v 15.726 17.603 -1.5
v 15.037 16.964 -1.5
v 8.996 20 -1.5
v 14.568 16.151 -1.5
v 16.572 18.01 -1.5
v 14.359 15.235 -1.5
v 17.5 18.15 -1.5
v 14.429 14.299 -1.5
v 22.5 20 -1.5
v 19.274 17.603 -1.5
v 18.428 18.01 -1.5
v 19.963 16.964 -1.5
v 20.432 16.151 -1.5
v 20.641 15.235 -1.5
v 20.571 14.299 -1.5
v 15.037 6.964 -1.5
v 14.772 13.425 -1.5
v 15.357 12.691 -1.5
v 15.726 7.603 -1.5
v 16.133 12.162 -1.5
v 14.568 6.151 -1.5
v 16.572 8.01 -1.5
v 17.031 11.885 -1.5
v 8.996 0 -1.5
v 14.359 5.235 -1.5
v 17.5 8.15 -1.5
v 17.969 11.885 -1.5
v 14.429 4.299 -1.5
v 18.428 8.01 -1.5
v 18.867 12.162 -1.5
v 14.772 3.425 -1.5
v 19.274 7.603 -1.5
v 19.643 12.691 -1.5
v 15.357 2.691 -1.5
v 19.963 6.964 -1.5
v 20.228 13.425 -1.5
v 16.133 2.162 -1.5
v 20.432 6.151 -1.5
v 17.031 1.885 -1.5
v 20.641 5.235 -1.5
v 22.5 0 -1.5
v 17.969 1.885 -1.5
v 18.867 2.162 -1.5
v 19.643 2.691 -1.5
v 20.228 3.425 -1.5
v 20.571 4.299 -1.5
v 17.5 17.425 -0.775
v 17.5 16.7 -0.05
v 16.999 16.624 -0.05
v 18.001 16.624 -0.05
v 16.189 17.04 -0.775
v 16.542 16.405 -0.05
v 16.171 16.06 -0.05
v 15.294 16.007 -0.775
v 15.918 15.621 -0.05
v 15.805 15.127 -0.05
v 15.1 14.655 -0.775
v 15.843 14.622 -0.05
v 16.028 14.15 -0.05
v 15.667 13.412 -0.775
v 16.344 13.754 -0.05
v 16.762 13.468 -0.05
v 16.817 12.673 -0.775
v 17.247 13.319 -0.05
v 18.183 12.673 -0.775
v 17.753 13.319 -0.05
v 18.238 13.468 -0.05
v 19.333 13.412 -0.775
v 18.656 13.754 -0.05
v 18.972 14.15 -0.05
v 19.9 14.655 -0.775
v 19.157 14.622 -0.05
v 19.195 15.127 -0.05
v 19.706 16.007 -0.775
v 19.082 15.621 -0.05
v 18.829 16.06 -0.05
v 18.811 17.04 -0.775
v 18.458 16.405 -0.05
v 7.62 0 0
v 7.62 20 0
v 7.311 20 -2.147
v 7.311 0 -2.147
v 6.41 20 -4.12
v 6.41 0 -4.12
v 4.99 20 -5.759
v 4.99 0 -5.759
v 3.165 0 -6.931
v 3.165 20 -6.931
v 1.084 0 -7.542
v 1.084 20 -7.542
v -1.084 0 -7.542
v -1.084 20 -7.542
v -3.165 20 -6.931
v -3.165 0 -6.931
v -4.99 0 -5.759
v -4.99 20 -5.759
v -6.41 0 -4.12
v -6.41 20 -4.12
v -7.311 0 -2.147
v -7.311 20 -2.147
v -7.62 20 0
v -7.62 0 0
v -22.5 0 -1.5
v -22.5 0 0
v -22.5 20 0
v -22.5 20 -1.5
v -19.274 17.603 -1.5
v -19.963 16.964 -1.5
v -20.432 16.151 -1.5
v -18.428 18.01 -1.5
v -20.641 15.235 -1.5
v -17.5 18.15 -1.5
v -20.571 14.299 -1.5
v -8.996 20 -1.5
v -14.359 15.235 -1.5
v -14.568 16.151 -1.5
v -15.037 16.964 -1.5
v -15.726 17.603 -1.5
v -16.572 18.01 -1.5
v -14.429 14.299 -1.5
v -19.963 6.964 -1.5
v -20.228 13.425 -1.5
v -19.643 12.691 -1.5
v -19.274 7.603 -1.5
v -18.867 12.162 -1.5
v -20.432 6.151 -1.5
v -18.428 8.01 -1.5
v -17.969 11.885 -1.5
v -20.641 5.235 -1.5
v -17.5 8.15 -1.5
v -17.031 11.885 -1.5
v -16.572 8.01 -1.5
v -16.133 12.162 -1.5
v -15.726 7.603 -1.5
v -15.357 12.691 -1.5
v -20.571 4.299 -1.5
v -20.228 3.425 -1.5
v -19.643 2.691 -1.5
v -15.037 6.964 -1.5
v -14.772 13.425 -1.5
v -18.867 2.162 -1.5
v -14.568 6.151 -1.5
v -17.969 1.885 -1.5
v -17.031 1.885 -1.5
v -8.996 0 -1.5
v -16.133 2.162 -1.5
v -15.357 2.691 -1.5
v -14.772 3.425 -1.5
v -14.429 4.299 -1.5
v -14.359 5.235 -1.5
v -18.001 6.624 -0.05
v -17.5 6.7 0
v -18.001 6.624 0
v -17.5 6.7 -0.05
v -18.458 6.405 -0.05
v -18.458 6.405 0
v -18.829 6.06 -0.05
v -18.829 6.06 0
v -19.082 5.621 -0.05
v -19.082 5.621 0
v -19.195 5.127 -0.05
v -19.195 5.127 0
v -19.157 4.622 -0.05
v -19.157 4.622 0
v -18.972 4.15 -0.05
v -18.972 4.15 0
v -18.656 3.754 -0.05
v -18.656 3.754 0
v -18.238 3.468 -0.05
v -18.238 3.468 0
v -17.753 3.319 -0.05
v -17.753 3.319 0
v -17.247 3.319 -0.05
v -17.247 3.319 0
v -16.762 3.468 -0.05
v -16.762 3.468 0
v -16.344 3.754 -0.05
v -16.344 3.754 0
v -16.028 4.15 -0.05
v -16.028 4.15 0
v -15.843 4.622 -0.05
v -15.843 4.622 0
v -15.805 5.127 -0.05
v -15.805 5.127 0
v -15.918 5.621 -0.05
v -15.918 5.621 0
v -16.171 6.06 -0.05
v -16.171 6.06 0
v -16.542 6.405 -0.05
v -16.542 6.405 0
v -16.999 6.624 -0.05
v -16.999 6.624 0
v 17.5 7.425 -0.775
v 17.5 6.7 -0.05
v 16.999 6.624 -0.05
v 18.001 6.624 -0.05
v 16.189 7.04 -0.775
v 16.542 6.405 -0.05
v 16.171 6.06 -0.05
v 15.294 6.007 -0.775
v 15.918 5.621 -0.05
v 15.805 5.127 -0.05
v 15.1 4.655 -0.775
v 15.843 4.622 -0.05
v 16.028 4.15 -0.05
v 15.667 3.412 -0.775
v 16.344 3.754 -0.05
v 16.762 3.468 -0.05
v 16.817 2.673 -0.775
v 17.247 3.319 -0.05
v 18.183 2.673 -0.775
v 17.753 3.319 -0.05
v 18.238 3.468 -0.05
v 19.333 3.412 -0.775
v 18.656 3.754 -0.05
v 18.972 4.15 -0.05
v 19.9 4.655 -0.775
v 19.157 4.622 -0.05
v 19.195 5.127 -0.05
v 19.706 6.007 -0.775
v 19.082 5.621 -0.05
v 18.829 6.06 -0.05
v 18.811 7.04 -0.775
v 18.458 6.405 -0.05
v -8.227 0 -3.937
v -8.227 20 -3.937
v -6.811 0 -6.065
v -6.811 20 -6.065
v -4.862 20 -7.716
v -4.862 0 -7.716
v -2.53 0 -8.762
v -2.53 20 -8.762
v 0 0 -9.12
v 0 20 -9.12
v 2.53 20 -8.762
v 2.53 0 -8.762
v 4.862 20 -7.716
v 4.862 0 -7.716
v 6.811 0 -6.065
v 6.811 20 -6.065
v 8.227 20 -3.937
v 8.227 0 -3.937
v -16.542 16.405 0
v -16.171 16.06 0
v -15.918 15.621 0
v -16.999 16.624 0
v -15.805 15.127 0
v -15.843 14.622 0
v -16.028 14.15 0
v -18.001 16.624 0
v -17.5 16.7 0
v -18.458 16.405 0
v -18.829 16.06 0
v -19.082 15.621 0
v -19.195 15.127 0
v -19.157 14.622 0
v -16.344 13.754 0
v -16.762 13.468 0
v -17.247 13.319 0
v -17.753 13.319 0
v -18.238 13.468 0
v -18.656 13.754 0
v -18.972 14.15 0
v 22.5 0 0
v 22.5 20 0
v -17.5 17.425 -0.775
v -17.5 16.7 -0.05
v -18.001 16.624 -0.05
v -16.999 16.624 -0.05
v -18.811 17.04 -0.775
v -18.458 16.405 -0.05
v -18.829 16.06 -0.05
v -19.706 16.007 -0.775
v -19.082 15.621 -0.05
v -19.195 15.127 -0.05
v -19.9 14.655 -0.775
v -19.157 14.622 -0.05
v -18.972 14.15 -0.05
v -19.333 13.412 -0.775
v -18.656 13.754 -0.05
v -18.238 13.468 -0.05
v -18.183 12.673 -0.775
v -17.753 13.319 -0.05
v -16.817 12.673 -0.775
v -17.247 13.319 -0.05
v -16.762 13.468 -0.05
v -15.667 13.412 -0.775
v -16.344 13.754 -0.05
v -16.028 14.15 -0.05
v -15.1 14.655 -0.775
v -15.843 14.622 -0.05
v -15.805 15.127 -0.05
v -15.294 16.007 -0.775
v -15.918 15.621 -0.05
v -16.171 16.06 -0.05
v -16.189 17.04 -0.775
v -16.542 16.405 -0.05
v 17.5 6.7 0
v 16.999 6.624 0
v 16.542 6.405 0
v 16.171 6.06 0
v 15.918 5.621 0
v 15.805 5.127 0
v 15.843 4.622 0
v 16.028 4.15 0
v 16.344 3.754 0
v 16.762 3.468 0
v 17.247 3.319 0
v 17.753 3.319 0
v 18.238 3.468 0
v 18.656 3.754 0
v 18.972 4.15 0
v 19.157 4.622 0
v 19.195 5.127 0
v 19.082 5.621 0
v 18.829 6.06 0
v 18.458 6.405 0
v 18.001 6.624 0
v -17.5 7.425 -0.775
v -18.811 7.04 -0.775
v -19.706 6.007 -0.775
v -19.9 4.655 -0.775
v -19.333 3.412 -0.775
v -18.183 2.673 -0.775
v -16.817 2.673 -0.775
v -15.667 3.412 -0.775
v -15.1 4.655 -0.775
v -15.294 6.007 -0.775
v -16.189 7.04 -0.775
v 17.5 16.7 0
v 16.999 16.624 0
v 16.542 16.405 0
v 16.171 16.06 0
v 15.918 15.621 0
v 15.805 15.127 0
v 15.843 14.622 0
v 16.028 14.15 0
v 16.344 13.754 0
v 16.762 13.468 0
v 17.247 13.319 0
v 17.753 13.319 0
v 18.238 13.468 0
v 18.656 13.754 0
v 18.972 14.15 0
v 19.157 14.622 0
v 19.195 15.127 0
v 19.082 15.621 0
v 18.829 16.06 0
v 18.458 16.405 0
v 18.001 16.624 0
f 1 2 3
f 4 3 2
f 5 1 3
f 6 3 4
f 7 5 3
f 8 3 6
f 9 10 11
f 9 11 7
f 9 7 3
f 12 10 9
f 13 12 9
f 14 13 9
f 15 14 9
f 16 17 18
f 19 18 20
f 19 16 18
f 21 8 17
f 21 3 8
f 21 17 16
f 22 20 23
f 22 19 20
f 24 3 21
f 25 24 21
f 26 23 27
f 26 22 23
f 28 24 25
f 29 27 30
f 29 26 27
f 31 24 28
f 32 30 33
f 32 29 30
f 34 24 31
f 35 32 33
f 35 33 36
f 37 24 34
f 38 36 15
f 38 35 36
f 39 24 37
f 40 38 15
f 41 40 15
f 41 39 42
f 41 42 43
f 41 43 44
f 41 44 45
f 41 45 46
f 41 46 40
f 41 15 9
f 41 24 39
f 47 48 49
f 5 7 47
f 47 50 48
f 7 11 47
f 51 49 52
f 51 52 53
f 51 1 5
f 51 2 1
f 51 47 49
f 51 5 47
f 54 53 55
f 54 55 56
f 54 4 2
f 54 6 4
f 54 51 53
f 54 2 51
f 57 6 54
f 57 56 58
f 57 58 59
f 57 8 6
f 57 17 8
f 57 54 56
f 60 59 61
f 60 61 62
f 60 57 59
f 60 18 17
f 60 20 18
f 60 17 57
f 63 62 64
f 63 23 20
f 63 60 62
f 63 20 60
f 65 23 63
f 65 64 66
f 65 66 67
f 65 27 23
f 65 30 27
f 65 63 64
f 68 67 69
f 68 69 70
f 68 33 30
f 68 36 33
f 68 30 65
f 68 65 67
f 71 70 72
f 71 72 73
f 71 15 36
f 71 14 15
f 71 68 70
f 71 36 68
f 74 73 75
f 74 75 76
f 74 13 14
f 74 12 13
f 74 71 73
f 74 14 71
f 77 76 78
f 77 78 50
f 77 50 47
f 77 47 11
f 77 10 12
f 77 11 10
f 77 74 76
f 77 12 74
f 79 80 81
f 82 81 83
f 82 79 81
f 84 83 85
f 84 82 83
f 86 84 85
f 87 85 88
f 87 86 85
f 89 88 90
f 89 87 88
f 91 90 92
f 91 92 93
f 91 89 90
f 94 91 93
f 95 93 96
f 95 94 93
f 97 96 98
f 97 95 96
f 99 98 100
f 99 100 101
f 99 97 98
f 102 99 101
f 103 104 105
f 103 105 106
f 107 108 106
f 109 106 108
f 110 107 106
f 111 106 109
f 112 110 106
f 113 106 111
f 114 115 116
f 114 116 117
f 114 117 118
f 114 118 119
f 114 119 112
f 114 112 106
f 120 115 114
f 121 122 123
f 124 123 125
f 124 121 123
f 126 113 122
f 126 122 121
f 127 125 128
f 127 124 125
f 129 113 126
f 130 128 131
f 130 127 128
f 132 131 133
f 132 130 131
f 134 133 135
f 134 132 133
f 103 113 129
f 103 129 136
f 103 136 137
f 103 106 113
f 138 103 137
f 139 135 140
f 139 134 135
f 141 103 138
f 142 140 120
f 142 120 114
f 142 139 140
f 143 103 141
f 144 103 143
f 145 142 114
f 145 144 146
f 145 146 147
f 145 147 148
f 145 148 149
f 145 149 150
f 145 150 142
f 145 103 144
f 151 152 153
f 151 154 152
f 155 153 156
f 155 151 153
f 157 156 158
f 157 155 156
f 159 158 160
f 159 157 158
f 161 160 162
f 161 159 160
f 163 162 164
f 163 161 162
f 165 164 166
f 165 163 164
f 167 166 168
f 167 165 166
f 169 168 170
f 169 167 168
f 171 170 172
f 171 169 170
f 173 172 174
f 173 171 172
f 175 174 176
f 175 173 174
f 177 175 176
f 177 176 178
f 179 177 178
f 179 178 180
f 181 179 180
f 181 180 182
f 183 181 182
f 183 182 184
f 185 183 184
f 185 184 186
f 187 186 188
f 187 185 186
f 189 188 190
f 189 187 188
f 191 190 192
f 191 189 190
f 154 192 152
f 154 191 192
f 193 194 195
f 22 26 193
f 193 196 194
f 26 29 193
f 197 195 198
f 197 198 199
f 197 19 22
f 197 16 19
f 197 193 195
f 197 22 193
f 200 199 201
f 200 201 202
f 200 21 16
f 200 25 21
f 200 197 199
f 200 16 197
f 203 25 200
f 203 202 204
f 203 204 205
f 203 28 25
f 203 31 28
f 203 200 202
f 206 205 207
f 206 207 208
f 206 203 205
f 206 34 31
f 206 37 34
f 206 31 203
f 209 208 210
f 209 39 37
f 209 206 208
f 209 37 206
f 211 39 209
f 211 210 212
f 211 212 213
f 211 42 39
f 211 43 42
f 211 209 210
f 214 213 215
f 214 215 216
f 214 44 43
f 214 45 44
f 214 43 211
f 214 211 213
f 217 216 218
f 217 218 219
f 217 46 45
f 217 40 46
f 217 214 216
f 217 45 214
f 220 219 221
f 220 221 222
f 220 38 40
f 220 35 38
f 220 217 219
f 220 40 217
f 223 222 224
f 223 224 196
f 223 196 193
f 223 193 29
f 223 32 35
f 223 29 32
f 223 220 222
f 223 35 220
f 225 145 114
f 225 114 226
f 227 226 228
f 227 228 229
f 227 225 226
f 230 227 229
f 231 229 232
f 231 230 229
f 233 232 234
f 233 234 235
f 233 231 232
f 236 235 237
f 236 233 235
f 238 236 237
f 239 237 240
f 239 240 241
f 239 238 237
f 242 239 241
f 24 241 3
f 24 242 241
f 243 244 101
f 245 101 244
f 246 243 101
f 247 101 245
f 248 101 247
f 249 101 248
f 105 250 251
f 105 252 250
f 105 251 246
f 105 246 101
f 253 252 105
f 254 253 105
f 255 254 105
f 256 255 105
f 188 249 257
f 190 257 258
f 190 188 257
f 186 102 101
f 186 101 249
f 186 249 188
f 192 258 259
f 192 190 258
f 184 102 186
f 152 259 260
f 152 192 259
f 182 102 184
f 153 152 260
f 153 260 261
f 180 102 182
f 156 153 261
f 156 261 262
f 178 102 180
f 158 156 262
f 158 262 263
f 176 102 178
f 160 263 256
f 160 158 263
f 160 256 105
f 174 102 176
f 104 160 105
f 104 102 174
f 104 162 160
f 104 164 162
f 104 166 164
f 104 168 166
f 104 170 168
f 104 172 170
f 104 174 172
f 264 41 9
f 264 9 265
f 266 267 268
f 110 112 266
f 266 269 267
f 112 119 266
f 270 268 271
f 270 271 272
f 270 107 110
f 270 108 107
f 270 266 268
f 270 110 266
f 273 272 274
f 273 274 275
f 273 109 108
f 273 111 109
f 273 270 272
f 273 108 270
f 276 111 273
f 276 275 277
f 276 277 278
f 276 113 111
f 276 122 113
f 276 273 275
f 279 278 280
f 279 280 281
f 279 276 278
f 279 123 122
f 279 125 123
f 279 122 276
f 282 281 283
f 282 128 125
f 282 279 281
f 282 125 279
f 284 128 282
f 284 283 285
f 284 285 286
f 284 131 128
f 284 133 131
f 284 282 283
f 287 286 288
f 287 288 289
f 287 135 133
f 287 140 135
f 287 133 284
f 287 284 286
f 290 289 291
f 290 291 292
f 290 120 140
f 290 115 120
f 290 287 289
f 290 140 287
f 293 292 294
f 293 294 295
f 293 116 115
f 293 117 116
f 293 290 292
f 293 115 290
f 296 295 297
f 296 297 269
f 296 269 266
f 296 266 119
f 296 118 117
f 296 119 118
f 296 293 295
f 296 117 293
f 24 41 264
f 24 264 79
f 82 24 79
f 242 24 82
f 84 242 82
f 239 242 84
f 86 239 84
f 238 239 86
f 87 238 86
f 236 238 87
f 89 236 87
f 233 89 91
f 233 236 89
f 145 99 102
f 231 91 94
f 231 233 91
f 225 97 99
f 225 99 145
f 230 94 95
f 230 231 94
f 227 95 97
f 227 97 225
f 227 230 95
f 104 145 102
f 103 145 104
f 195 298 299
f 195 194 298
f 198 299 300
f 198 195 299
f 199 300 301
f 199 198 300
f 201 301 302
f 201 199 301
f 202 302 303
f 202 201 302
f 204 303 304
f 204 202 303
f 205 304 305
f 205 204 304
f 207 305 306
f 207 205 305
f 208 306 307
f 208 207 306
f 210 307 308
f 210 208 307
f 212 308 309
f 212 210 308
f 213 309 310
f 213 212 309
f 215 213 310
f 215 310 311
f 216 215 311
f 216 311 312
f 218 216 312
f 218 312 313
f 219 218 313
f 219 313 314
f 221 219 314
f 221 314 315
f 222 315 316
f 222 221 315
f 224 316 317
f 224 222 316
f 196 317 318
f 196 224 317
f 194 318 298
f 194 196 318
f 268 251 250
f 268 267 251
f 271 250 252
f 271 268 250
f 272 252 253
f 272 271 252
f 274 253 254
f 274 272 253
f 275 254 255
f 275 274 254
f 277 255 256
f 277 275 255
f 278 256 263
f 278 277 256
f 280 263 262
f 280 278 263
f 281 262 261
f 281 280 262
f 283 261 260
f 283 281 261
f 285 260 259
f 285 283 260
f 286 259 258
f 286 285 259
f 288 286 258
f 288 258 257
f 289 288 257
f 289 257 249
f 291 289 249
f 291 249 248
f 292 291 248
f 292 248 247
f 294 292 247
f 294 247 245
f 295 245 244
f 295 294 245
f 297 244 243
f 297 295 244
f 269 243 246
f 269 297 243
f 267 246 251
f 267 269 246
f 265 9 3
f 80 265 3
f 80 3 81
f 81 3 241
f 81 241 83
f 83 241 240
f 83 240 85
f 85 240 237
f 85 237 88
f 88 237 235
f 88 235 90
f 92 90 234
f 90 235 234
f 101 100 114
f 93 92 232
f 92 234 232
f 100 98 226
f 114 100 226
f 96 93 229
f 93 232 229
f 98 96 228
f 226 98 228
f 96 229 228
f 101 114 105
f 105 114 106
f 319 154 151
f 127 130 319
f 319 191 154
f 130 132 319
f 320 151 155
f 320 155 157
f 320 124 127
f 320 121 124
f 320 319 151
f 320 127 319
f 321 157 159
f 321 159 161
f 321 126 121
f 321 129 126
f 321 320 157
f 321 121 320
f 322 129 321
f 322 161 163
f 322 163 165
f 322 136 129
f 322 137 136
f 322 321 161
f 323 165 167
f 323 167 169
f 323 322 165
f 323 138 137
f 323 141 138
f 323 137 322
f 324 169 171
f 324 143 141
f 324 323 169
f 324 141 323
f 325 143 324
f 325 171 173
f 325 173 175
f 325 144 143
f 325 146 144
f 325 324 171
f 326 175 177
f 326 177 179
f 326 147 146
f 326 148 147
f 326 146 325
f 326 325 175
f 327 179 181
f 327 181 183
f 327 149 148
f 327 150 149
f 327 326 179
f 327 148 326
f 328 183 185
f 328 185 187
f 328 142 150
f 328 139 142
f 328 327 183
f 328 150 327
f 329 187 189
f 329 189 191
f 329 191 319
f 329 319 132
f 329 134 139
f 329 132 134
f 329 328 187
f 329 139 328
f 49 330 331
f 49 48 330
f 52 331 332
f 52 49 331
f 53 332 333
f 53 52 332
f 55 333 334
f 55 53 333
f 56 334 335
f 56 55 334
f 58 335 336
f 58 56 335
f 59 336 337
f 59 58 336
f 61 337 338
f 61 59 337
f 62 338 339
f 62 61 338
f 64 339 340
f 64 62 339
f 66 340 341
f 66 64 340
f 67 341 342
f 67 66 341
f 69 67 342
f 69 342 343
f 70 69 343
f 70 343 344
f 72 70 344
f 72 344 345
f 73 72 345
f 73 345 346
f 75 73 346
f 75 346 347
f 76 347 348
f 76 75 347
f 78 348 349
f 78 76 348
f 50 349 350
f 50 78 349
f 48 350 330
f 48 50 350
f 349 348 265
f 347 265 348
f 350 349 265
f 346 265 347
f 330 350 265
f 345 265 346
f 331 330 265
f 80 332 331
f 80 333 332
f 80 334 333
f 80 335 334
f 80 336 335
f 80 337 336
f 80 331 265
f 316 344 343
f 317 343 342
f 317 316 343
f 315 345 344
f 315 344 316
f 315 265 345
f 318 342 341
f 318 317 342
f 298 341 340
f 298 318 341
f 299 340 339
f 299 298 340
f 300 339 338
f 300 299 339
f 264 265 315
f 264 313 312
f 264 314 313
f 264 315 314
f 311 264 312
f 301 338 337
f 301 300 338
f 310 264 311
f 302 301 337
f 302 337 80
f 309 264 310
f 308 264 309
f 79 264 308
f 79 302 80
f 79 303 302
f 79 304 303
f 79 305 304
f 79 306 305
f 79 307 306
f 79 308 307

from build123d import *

# Parameters (mm, degrees)
BOSS_EXTRUDE1_DEPTH                          = 20
CSK_FOR_M3_COUNTERSUNK_FLAT_HEAD_SCR_2_COUNT = 2
CSK_FOR_M3_COUNTERSUNK_FLAT_HEAD_SCR_2_PITCH = 35
CSK_FOR_M3_COUNTERSUNK_FLAT_HEAD_SCR_3_COUNT = 2
CSK_FOR_M3_COUNTERSUNK_FLAT_HEAD_SCR_3_PITCH = 10
CSK_FOR_M3_COUNTERSUNK_FLAT_HEAD_SCR_4_COUNT = 2
CSK_FOR_M3_COUNTERSUNK_FLAT_HEAD_SCR_4_PITCH = 36.400549446


with BuildPart() as part:
    # Sketch1 → Boss-Extrude1 (new body)
    with BuildSketch(Plane(origin=(0, 0, 0), x_dir=(1, 0, 0), z_dir=(0, 1, 0))):
        with BuildLine():
            Line((-7.62, 0), (-22.5, 0))
            Line((-22.5, 0), (-22.5, 1.5))
            Line((-22.5, 1.5), (-8.99579902, 1.5))
            ThreePointArc((-8.99579902, 1.5), (0, 9.12), (8.99579902, 1.5))
            Line((8.99579902, 1.5), (22.5, 1.5))
            Line((22.5, 1.5), (22.5, 0))
            Line((22.5, 0), (7.62, 0))
            ThreePointArc((7.62, 0), (0, 7.62), (-7.62, 0))
        make_face()
    extrude(amount=BOSS_EXTRUDE1_DEPTH)

    # Sketch3 → CSK for M3 Countersunk Flat Head Screw1 (revolve, cut)
    with BuildSketch(Plane(origin=(17.5, 5, -1.5), x_dir=(0, 1, 0), z_dir=(1, 0, 0))):
        Polygon((0, 0), (0, 1.5), (1.7, 1.5), (1.7, 1.45), (3.15, 0), align=None)
    csk_for_m3_countersunk_flat_head_screw1 = revolve(axis=Axis((17.5, 5, -7.85), (0, 0, 1)), mode=Mode.SUBTRACT)

    # CSK for M3 Countersunk Flat Head Scr 2: CSK for M3 Countersunk Flat Head Screw1 ×2
    with Locations(*[(-i * CSK_FOR_M3_COUNTERSUNK_FLAT_HEAD_SCR_2_PITCH, 0, 0) for i in range(1, CSK_FOR_M3_COUNTERSUNK_FLAT_HEAD_SCR_2_COUNT)]):
        add(csk_for_m3_countersunk_flat_head_screw1, mode=Mode.SUBTRACT)

    # CSK for M3 Countersunk Flat Head Scr 3: CSK for M3 Countersunk Flat Head Screw1 ×2
    with Locations(*[(0, i * CSK_FOR_M3_COUNTERSUNK_FLAT_HEAD_SCR_3_PITCH, 0) for i in range(1, CSK_FOR_M3_COUNTERSUNK_FLAT_HEAD_SCR_3_COUNT)]):
        add(csk_for_m3_countersunk_flat_head_screw1, mode=Mode.SUBTRACT)

    # CSK for M3 Countersunk Flat Head Scr 4: CSK for M3 Countersunk Flat Head Screw1 ×2
    with Locations(*[Vector(-0.9615239476408232, 0.27472112789737807, 0) * (i * CSK_FOR_M3_COUNTERSUNK_FLAT_HEAD_SCR_4_PITCH) for i in range(1, CSK_FOR_M3_COUNTERSUNK_FLAT_HEAD_SCR_4_COUNT)]):
        add(csk_for_m3_countersunk_flat_head_screw1, mode=Mode.SUBTRACT)


solid = part.part
